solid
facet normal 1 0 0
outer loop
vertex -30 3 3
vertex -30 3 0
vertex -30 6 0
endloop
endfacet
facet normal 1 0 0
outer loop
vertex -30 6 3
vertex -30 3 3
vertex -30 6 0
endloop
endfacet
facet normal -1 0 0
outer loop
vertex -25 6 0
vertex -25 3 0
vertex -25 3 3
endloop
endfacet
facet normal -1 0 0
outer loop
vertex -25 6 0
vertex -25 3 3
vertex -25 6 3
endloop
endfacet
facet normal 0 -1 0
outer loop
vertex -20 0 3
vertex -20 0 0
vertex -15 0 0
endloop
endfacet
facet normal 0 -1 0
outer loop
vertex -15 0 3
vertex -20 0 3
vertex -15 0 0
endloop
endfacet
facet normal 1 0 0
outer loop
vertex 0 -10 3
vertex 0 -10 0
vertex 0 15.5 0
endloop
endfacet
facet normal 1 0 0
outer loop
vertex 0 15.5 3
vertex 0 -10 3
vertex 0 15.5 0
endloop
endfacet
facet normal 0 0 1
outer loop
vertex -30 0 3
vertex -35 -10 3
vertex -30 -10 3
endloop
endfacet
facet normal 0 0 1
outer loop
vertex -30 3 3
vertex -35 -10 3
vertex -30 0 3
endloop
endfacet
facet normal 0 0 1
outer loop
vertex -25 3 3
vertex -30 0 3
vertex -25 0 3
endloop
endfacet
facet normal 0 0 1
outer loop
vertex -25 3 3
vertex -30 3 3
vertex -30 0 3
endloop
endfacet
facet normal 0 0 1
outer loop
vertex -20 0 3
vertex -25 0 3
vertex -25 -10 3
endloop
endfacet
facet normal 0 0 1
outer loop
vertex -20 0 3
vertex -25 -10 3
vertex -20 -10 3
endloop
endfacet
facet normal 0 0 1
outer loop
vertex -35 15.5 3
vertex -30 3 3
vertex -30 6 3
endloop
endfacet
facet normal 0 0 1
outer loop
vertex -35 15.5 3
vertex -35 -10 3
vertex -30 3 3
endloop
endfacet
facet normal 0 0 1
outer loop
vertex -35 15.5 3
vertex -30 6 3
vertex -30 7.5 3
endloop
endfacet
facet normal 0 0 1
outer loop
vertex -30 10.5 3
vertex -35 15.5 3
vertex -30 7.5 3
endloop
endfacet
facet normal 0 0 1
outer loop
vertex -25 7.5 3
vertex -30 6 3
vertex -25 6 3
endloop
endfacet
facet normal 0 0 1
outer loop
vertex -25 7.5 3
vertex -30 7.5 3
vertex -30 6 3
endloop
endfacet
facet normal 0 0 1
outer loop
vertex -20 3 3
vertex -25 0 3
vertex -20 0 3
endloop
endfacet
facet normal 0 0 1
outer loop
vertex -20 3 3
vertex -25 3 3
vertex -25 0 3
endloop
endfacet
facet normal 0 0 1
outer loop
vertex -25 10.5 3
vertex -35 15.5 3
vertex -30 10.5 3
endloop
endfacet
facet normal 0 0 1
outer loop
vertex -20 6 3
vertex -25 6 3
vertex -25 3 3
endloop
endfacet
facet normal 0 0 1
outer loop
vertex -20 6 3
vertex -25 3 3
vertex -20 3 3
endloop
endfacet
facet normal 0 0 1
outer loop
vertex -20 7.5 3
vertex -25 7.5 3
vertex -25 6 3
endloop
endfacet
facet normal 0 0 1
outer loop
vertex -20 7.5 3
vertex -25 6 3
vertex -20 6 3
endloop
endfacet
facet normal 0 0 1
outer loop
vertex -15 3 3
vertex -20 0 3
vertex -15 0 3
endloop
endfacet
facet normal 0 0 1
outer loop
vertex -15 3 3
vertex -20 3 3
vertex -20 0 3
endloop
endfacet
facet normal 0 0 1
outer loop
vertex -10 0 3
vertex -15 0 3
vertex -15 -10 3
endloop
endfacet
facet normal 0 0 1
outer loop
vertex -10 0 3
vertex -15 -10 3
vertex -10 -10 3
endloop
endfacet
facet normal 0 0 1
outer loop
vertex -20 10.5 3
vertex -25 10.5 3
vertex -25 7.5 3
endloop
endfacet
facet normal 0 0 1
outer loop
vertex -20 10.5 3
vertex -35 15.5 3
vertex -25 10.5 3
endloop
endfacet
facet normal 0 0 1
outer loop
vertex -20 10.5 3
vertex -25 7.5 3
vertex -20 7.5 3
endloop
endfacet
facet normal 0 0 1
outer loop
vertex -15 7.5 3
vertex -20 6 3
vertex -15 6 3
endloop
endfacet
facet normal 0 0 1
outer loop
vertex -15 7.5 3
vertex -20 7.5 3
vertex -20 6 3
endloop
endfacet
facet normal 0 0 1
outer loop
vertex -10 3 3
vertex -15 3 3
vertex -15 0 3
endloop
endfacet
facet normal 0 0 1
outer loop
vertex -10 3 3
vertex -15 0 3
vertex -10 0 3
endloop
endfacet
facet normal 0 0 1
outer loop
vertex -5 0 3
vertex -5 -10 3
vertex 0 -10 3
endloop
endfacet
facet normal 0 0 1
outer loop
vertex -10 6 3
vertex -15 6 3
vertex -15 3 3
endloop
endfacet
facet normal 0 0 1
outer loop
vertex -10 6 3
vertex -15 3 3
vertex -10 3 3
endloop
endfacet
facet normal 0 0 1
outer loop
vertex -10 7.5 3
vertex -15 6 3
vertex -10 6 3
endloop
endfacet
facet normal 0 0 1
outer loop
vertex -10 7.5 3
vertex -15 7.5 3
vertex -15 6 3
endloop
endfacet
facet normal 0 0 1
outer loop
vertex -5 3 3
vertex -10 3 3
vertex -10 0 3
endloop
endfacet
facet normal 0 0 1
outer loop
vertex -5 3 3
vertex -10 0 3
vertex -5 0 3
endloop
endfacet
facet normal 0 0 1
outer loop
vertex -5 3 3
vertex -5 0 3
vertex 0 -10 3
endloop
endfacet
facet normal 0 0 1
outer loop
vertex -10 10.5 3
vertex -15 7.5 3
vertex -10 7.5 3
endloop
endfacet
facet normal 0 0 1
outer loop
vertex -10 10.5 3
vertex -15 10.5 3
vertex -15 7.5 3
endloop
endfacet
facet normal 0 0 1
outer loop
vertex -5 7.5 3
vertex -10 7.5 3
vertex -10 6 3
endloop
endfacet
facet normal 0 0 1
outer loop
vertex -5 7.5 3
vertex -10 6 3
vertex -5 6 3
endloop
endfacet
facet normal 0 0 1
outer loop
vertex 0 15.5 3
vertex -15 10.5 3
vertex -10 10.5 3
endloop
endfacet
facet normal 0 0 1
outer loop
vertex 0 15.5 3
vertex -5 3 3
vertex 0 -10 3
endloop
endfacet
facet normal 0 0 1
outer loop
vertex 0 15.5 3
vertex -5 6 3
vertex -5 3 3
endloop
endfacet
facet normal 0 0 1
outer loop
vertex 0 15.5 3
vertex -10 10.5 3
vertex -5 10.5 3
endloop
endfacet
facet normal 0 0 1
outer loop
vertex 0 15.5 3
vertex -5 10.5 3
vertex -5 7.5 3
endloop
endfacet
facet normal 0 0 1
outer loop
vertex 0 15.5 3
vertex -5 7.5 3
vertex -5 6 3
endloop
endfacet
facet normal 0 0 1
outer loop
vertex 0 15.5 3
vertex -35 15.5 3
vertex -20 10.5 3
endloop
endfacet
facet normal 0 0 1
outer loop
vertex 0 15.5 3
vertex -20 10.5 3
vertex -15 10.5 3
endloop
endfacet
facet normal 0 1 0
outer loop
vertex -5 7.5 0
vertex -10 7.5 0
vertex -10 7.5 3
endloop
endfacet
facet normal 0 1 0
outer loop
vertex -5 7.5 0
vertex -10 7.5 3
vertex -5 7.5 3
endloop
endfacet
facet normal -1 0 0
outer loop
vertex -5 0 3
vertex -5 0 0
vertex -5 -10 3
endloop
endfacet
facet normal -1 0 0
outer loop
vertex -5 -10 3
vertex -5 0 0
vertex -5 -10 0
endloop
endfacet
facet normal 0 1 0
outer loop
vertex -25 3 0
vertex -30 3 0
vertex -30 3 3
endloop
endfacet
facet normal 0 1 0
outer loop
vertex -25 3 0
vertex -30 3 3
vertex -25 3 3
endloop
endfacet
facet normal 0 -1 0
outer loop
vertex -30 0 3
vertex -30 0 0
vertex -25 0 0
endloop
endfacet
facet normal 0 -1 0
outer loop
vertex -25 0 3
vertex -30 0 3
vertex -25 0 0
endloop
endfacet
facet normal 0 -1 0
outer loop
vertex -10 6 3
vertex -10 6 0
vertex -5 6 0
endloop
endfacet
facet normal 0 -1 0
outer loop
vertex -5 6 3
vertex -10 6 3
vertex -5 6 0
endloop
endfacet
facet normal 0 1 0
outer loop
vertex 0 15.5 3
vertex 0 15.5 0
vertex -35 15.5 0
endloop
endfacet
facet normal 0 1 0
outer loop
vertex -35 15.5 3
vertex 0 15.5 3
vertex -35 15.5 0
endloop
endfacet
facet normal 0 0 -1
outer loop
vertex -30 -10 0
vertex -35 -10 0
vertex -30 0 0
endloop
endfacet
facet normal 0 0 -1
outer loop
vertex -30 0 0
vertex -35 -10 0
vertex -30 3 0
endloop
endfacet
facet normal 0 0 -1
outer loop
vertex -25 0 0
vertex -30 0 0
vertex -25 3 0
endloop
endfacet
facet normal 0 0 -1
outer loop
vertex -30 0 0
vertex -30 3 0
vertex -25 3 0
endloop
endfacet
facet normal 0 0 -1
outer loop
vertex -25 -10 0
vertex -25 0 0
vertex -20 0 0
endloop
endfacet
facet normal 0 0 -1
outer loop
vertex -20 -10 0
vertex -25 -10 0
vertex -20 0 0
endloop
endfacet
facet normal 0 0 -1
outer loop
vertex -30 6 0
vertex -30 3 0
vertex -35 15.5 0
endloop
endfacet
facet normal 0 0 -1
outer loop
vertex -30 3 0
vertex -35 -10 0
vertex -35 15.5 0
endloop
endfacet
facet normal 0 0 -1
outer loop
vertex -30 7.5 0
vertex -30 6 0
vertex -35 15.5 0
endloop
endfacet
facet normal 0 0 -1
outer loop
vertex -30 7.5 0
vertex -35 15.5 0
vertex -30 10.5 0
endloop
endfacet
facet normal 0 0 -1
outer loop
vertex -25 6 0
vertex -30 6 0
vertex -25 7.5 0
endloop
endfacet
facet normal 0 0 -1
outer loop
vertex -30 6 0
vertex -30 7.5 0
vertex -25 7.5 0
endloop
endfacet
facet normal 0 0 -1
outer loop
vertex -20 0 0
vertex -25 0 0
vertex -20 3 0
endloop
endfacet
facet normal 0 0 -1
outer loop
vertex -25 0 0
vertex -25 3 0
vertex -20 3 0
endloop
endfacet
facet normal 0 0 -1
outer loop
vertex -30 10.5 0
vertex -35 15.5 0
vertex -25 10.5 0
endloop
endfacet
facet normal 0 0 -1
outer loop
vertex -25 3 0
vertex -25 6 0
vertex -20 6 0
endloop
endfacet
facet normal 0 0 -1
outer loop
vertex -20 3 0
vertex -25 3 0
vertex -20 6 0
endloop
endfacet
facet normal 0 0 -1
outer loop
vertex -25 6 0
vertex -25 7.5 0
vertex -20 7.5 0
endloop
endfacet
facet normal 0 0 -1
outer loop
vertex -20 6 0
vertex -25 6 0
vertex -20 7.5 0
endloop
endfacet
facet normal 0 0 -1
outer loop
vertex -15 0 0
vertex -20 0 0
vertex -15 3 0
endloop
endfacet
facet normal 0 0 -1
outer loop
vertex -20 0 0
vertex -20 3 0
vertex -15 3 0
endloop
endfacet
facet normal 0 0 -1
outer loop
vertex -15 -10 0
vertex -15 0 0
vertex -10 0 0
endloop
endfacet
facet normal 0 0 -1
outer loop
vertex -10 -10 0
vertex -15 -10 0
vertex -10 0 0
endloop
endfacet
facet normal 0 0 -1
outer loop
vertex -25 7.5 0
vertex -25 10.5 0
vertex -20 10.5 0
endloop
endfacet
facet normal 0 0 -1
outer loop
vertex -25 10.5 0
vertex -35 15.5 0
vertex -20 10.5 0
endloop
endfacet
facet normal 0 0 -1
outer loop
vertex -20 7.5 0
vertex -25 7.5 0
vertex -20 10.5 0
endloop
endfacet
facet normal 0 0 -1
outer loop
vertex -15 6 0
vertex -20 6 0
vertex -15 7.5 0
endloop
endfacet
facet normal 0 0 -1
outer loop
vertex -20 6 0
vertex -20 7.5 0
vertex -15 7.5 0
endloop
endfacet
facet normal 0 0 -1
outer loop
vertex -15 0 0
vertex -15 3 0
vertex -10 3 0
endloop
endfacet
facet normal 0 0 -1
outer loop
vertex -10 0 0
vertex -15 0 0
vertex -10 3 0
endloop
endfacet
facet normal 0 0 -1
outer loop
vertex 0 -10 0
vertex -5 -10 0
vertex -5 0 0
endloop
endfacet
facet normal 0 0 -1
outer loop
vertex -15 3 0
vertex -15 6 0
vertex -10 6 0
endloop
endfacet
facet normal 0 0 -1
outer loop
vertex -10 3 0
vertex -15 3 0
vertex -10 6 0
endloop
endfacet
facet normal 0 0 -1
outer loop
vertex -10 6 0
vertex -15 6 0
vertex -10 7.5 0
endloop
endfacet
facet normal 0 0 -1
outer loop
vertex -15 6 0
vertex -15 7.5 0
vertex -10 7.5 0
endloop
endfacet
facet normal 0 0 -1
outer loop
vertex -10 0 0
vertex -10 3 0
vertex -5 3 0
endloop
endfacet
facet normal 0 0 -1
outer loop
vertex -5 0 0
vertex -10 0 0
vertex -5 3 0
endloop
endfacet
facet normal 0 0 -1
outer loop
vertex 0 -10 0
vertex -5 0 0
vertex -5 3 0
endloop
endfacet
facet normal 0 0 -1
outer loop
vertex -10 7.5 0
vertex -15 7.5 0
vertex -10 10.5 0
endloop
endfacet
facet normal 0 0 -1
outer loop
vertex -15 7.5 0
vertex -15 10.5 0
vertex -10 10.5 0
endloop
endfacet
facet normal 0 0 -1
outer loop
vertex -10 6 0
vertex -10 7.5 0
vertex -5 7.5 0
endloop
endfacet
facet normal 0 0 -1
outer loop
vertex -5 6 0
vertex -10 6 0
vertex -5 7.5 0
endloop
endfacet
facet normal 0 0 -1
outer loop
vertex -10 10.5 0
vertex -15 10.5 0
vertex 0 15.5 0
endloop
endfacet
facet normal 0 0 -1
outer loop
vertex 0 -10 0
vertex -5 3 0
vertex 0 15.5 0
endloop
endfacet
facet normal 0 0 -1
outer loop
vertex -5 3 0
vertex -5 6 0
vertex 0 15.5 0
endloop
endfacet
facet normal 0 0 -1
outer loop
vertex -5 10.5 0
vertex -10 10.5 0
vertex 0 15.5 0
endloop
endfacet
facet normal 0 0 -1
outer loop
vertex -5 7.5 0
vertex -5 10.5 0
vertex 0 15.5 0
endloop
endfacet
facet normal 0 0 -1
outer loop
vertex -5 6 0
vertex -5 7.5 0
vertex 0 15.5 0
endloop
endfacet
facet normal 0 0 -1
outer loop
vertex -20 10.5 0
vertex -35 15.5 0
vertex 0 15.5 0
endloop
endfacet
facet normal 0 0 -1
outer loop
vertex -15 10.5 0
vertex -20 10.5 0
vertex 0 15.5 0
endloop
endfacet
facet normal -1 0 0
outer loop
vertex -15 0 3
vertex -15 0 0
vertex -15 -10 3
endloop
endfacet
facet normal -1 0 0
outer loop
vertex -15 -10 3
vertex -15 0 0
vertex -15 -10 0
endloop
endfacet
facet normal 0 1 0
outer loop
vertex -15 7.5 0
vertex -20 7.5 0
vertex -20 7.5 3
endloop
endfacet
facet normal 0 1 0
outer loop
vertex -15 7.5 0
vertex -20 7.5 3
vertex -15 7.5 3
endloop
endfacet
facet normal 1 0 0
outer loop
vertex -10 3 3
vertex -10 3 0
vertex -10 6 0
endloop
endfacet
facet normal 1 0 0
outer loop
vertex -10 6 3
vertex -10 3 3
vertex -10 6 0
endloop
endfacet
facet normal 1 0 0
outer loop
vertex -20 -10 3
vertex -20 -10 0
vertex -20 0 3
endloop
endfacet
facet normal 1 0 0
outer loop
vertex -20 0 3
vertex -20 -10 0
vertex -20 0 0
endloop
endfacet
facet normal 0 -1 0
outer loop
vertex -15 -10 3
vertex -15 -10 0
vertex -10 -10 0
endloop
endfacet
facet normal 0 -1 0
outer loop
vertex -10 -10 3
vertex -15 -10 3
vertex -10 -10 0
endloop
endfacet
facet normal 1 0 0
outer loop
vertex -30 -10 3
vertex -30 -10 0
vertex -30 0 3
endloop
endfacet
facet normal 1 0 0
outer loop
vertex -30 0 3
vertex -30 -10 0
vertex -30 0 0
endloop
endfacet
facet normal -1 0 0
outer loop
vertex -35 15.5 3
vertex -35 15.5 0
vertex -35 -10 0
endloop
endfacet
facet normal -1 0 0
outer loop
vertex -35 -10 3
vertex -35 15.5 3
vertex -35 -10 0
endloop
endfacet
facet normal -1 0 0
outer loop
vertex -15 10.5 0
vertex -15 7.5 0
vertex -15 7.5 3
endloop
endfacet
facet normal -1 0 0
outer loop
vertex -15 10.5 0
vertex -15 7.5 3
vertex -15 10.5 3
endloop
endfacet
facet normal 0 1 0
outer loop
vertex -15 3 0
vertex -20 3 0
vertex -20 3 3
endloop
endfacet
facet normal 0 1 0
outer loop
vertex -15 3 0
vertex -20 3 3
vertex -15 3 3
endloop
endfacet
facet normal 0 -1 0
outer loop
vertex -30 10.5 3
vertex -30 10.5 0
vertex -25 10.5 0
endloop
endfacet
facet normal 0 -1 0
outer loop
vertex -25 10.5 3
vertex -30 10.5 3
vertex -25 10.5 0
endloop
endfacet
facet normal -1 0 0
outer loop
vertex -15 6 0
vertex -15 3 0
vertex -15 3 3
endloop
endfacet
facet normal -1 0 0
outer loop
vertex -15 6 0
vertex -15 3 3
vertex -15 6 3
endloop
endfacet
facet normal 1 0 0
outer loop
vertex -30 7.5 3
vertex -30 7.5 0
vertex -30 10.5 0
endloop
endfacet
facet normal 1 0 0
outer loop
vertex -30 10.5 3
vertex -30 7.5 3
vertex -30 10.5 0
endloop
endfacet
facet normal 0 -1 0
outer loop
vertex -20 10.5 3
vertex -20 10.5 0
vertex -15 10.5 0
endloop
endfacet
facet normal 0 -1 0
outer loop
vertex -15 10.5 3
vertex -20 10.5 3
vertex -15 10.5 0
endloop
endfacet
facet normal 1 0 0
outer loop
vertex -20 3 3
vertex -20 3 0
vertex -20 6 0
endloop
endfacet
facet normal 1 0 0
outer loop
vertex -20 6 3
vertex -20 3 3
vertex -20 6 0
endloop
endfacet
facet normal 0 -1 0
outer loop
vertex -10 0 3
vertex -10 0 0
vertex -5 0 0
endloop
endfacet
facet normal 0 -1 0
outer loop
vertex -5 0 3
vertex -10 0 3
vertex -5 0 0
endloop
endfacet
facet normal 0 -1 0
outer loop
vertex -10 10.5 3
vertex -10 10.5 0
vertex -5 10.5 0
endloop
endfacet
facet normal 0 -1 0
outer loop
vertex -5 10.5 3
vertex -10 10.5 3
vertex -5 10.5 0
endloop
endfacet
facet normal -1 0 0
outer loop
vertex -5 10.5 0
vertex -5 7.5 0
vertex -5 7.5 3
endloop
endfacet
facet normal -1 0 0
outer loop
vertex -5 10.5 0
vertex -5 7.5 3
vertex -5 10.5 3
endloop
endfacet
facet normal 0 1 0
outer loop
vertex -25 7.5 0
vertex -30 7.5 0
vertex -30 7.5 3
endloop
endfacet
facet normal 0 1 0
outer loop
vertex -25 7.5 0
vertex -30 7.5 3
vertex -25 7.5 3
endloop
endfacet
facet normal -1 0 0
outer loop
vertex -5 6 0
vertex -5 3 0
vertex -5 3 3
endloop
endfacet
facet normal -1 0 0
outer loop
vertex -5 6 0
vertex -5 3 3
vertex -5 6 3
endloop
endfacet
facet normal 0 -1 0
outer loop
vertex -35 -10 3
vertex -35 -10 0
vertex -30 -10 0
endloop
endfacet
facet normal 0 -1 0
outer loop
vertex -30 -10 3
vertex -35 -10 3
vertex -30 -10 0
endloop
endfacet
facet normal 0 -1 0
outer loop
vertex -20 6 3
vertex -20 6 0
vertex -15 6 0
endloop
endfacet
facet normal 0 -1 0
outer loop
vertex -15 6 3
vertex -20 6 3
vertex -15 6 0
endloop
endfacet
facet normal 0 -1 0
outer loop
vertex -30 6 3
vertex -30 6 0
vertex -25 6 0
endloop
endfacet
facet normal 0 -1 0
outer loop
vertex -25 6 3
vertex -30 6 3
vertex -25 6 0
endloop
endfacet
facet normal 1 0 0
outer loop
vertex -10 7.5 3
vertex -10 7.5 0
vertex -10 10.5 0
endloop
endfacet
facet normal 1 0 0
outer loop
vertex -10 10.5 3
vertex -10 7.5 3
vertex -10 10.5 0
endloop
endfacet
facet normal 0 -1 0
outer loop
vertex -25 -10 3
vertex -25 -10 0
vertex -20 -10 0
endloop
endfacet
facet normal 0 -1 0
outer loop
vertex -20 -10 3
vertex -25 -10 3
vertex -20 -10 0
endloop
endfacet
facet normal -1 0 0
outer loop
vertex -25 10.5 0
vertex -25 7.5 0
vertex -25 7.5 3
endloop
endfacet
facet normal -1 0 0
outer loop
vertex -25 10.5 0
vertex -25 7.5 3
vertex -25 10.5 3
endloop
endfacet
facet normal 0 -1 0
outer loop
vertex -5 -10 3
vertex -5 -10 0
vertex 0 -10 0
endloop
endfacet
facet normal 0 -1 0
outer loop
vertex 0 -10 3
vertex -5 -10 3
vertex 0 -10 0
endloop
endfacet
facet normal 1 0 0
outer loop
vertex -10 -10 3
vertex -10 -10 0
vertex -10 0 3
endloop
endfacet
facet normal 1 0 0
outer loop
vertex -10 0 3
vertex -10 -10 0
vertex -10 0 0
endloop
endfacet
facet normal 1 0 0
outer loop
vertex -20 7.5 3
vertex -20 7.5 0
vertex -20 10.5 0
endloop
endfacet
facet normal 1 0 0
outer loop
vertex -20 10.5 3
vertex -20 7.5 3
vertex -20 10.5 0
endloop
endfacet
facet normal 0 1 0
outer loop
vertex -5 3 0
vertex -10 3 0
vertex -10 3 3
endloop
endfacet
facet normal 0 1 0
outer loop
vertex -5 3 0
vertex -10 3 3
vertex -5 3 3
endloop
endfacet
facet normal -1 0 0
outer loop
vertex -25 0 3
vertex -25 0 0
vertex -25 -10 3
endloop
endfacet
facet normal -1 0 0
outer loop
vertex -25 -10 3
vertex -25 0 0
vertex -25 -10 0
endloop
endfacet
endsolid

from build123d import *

# Parameters (mm, degrees)
ESQUISSE1_W        = 5
ESQUISSE1_H        = 3
BOSS_EXTRU_1_DEPTH = 3


with BuildPart() as part:
    # Esquisse1 → Boss.-Extru.1 (new body)
    with BuildSketch(Plane.XY):
        Polygon((-20, -10), (-20, 0), (-15, 0), (-15, -10), (-10, -10), (-10, 0), (-5, 0), (-5, -10), (0, -10), (0, 15.5), (-35, 15.5), (-35, -10), (-30, -10), (-30, 0), (-25, 0), (-25, -10), align=None)
        with Locations((-7.5, 9)):
            Rectangle(ESQUISSE1_W, ESQUISSE1_H, mode=Mode.SUBTRACT)
        with Locations((-17.5, 9)):
            Rectangle(ESQUISSE1_W, ESQUISSE1_H, mode=Mode.SUBTRACT)
        with Locations((-27.5, 9)):
            Rectangle(ESQUISSE1_W, ESQUISSE1_H, mode=Mode.SUBTRACT)
        with Locations((-7.5, 4.5)):
            Rectangle(ESQUISSE1_W, ESQUISSE1_H, mode=Mode.SUBTRACT)
        with Locations((-17.5, 4.5)):
            Rectangle(ESQUISSE1_W, ESQUISSE1_H, mode=Mode.SUBTRACT)
        with Locations((-27.5, 4.5)):
            Rectangle(ESQUISSE1_W, ESQUISSE1_H, mode=Mode.SUBTRACT)
    extrude(amount=BOSS_EXTRU_1_DEPTH)


solid = part.part
